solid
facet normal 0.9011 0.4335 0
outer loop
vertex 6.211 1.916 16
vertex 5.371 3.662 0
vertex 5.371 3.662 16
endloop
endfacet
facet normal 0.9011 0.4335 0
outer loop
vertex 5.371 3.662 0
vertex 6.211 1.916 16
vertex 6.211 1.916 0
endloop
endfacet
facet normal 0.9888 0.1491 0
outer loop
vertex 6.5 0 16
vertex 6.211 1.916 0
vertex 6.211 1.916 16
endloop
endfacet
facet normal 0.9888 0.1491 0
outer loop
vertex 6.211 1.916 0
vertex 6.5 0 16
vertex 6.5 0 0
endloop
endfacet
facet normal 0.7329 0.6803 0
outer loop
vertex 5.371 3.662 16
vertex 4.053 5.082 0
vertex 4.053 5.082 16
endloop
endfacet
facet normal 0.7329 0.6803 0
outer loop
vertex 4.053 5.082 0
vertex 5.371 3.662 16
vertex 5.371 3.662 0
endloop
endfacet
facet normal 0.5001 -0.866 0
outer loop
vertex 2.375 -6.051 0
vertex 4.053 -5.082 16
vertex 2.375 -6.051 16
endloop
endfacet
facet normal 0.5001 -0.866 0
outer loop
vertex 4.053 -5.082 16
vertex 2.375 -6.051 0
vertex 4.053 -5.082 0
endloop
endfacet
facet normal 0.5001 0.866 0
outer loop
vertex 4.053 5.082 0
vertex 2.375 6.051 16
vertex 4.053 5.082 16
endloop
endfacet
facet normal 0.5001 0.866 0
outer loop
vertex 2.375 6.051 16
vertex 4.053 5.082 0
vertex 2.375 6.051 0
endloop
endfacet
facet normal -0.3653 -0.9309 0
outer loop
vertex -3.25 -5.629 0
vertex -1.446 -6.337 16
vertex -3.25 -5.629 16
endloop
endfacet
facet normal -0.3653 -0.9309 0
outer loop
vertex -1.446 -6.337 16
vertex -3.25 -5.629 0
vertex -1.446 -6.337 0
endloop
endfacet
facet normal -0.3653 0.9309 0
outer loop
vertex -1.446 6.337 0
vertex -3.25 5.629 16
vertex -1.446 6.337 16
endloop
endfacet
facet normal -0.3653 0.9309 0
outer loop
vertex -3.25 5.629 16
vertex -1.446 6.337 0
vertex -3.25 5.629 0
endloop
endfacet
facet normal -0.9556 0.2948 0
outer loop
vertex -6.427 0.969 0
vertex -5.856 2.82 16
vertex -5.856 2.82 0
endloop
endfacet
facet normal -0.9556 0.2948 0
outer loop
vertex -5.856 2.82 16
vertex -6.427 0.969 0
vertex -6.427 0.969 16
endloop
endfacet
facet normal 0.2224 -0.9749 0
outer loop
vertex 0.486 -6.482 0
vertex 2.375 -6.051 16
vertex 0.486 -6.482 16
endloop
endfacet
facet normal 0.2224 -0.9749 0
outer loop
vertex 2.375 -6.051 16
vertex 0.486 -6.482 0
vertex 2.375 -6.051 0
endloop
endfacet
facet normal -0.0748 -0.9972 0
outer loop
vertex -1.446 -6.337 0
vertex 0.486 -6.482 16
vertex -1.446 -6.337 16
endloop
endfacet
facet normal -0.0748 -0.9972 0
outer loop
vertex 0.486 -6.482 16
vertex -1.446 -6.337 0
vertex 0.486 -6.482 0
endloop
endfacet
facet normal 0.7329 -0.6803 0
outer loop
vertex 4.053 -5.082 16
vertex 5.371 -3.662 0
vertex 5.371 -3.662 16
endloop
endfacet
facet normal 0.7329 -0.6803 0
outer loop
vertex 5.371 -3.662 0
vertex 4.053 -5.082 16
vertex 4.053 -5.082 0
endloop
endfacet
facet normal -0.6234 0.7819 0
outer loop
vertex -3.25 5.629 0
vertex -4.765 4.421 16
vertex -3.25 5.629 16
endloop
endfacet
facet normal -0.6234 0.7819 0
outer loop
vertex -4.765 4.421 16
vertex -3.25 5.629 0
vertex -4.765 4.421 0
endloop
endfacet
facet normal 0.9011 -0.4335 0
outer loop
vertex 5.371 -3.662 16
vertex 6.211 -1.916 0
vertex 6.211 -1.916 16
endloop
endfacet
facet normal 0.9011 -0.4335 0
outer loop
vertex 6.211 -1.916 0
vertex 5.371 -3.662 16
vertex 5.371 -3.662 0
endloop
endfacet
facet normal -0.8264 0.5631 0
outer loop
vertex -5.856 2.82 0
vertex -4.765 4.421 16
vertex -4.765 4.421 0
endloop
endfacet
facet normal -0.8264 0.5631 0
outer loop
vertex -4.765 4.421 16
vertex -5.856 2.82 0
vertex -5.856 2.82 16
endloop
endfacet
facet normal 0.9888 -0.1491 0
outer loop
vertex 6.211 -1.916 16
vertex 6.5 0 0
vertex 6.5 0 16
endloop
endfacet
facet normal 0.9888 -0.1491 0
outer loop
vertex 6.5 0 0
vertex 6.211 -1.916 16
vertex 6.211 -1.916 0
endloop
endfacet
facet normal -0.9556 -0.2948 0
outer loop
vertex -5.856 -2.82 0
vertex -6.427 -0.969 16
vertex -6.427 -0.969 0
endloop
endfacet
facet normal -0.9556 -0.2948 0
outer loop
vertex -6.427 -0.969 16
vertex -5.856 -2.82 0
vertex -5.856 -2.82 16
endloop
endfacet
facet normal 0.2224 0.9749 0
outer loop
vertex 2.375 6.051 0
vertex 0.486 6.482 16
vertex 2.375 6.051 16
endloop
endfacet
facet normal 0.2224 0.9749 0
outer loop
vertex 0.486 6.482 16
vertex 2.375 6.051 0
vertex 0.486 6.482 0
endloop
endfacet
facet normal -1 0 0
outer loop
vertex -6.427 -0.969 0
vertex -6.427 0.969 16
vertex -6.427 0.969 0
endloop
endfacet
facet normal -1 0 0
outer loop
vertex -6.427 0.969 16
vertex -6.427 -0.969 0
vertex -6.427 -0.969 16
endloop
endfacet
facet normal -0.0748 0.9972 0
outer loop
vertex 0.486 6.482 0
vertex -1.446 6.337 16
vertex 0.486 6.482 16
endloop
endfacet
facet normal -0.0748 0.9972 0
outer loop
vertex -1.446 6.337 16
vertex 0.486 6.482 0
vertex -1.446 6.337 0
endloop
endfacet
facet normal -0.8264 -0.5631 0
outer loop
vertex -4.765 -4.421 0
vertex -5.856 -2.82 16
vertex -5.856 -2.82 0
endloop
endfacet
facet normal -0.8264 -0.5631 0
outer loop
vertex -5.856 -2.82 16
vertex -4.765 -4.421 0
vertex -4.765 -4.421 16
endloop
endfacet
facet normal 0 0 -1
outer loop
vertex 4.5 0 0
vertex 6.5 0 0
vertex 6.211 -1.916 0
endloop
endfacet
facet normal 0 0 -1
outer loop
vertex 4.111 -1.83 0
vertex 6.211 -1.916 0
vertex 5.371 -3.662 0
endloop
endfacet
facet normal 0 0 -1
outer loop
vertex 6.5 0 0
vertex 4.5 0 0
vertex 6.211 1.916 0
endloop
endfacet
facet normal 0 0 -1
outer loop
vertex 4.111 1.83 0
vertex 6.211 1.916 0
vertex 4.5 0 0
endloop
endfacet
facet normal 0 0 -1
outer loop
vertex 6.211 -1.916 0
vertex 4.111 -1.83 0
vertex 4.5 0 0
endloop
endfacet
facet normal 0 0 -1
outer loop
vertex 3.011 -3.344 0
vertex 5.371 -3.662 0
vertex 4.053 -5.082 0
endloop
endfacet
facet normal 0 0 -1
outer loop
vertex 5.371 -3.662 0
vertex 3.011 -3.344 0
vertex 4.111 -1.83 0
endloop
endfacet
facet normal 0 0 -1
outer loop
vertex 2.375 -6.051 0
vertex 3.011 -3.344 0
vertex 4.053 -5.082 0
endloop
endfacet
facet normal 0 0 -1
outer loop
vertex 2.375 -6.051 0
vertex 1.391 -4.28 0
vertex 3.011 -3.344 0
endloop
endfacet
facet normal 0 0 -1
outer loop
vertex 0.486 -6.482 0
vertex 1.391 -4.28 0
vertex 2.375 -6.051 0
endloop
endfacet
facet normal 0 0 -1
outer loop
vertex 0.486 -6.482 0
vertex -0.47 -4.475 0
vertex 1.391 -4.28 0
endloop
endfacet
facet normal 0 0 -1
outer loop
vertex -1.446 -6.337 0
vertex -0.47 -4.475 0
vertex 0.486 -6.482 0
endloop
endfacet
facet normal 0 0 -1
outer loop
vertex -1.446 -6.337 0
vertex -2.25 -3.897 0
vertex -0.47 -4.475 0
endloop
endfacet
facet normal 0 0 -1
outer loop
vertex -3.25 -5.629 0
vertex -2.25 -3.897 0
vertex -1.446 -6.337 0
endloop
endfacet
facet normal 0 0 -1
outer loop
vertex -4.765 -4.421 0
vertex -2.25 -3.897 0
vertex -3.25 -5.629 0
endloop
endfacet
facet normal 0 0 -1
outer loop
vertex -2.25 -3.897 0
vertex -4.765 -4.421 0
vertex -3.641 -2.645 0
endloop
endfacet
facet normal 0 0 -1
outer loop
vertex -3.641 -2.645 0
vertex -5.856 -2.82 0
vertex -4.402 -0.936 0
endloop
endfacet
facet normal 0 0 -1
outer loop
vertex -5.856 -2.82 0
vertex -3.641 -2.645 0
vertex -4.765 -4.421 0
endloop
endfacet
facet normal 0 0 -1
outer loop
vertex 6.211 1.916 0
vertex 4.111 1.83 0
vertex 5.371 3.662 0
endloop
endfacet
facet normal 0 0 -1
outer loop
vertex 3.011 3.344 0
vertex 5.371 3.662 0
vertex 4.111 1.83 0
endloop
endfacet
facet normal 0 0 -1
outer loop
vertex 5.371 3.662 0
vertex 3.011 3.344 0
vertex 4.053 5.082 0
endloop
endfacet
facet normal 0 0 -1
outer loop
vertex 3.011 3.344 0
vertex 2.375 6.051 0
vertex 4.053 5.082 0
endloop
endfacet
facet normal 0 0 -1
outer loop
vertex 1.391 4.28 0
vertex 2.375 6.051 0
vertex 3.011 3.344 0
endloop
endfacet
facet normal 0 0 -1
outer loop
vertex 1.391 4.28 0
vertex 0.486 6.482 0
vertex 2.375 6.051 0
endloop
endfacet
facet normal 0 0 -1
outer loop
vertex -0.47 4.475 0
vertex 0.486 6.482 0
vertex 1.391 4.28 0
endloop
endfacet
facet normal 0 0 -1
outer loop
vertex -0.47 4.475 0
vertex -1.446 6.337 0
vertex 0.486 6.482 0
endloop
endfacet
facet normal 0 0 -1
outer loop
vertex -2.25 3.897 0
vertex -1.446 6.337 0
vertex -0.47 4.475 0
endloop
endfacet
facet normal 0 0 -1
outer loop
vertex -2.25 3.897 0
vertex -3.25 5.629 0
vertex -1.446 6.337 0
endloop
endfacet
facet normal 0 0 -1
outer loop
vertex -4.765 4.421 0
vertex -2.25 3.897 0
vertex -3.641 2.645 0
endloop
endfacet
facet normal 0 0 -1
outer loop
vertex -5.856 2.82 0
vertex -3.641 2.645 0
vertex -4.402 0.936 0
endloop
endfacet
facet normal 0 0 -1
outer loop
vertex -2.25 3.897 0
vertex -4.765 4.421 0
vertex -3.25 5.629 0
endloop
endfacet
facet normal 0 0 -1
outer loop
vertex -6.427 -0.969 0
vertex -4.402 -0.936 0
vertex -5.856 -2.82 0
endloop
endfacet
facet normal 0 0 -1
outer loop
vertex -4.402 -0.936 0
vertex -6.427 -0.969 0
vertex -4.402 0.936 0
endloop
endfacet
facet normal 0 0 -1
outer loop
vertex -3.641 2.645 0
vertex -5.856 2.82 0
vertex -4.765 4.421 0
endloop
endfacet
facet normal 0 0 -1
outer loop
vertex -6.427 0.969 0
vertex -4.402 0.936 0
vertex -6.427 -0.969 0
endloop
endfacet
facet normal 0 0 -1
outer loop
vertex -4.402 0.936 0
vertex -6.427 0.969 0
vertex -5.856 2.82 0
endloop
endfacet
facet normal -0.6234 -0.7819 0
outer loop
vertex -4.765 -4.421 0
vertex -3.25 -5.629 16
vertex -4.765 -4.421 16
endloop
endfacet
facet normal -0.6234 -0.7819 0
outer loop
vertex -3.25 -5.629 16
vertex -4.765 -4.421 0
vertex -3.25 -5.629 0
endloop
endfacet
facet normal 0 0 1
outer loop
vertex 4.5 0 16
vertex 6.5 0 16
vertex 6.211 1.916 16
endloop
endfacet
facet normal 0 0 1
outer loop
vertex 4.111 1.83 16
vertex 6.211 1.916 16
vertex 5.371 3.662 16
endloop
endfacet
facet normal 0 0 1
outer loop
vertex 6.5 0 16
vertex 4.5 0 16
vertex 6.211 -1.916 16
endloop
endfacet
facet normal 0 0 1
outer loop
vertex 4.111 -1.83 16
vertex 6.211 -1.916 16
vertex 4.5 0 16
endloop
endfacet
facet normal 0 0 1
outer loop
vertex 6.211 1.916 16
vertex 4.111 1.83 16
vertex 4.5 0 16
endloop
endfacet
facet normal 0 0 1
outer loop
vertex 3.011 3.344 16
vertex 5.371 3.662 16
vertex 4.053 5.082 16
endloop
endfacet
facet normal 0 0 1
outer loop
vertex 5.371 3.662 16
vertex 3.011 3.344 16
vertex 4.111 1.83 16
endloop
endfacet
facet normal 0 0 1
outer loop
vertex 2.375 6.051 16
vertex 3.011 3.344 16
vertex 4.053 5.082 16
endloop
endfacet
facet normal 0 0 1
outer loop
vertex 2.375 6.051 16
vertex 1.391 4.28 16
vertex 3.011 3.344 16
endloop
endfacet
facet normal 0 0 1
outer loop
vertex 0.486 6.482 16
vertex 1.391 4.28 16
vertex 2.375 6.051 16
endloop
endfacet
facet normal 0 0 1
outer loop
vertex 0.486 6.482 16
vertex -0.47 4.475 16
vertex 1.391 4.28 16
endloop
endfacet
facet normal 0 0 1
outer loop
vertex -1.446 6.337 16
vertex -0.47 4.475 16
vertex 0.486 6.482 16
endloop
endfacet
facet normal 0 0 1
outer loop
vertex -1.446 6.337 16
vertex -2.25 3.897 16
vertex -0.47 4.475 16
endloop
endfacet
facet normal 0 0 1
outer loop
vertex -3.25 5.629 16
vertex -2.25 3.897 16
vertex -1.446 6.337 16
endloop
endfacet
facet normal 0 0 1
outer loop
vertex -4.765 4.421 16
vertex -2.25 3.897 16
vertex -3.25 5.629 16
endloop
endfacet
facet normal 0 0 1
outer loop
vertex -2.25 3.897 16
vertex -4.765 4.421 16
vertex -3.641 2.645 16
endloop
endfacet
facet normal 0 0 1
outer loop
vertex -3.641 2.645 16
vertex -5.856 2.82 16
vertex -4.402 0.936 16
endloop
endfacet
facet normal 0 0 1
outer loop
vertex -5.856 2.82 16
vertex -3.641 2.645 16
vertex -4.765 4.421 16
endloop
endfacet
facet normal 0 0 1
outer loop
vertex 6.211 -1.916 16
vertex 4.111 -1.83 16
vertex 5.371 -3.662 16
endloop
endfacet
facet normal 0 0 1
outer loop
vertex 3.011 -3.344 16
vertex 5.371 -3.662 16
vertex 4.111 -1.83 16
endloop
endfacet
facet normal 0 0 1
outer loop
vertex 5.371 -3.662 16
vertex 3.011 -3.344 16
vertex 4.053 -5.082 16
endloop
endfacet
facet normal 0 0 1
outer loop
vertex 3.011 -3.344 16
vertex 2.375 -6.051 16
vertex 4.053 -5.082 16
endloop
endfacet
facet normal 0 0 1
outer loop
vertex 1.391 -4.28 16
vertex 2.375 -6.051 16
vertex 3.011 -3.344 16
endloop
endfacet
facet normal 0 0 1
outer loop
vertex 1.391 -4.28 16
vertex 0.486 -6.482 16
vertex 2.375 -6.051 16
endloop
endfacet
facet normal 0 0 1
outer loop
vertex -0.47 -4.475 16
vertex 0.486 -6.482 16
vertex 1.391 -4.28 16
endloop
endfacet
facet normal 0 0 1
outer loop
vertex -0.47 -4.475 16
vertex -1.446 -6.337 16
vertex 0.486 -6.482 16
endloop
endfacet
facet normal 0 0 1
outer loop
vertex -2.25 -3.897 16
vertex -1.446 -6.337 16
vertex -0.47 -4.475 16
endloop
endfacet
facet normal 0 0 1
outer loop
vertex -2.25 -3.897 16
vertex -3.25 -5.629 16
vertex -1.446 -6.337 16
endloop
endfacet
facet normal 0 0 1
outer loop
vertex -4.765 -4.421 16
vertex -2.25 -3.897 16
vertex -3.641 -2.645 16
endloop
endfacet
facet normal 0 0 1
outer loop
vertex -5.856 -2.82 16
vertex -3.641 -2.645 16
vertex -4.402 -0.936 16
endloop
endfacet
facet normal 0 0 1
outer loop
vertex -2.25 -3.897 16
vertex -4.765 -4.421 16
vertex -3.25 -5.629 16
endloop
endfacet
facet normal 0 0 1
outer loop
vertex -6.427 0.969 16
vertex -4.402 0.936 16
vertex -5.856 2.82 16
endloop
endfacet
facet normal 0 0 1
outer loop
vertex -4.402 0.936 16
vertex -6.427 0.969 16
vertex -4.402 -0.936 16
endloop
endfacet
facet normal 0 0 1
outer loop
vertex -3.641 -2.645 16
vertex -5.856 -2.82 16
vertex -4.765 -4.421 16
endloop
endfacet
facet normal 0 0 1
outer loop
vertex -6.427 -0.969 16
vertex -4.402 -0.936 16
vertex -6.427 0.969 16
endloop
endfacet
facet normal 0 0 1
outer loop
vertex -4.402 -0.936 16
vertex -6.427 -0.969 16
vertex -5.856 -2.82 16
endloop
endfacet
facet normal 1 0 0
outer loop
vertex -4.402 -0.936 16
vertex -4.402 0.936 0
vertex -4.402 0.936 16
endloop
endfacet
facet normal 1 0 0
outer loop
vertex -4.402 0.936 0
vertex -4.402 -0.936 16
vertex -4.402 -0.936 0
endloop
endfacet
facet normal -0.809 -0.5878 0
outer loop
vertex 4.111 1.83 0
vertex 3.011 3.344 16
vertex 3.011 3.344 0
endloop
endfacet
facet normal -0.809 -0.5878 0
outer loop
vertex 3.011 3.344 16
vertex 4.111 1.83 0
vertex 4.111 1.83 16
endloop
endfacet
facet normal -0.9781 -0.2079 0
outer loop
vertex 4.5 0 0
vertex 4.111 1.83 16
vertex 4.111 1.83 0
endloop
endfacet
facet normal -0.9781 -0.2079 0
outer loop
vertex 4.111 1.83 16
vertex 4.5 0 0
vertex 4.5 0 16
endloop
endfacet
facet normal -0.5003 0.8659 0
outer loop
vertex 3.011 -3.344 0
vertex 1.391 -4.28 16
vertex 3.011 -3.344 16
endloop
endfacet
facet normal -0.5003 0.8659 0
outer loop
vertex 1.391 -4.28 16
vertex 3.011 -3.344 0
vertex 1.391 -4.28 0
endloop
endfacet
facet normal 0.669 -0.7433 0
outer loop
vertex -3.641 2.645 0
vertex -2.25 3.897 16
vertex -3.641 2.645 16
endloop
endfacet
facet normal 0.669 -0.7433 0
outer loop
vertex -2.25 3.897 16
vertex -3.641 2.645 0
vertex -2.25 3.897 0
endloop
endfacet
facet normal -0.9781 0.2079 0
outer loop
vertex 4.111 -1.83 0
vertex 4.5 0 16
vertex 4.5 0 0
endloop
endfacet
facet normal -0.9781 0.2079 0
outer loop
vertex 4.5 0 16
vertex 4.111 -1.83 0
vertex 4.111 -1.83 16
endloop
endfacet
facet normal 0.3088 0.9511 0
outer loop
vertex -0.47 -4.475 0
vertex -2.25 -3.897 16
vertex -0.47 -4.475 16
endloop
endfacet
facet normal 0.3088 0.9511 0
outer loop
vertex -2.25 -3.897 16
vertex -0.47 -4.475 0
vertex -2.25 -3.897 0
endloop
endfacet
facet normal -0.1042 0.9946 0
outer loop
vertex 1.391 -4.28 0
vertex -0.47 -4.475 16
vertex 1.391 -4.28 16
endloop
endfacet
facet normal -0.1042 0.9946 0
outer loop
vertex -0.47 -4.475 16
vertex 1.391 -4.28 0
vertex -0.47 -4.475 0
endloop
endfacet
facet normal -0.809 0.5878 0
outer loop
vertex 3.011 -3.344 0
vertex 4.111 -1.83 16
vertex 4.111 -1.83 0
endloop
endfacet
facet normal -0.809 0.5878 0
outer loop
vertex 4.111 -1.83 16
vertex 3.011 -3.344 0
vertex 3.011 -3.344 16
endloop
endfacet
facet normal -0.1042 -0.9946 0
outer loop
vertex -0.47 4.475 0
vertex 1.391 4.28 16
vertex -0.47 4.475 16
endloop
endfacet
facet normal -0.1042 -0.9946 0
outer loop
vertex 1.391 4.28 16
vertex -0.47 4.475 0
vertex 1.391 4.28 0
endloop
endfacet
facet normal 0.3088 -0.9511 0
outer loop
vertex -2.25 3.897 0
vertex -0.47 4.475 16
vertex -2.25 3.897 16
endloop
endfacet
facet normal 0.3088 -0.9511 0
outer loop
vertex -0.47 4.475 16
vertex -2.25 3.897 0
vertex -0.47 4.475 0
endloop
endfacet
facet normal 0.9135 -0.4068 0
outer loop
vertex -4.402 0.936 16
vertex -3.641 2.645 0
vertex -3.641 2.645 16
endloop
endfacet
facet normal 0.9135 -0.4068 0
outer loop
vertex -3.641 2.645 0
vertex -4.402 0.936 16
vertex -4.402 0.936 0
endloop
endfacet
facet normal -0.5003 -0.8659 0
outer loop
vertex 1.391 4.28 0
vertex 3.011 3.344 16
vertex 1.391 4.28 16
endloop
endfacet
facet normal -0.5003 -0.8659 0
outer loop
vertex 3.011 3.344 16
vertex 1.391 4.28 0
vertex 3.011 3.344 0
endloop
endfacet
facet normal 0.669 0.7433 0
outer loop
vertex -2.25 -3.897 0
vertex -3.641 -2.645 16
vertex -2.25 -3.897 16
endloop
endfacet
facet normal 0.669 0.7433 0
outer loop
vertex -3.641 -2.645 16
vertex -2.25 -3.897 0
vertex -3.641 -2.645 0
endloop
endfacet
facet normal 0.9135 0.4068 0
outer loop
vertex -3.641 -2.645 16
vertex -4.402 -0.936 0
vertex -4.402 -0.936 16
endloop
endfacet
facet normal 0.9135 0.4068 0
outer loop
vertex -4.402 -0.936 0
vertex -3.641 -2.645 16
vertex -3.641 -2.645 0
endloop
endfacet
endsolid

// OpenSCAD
// file: steering_spacer.scad
module SteeringSpacer(h)
{
  difference()
  {
    cylinder(h=h, d=13);

    translate([0, 0, -1])
    {
      cylinder(h=h+2, d=9);
    }
  }
}
// main file
use <steering_spacer.scad>;

module SteeringSpacerExtended()
{
  SteeringSpacer(16);
}

SteeringSpacerExtended();
